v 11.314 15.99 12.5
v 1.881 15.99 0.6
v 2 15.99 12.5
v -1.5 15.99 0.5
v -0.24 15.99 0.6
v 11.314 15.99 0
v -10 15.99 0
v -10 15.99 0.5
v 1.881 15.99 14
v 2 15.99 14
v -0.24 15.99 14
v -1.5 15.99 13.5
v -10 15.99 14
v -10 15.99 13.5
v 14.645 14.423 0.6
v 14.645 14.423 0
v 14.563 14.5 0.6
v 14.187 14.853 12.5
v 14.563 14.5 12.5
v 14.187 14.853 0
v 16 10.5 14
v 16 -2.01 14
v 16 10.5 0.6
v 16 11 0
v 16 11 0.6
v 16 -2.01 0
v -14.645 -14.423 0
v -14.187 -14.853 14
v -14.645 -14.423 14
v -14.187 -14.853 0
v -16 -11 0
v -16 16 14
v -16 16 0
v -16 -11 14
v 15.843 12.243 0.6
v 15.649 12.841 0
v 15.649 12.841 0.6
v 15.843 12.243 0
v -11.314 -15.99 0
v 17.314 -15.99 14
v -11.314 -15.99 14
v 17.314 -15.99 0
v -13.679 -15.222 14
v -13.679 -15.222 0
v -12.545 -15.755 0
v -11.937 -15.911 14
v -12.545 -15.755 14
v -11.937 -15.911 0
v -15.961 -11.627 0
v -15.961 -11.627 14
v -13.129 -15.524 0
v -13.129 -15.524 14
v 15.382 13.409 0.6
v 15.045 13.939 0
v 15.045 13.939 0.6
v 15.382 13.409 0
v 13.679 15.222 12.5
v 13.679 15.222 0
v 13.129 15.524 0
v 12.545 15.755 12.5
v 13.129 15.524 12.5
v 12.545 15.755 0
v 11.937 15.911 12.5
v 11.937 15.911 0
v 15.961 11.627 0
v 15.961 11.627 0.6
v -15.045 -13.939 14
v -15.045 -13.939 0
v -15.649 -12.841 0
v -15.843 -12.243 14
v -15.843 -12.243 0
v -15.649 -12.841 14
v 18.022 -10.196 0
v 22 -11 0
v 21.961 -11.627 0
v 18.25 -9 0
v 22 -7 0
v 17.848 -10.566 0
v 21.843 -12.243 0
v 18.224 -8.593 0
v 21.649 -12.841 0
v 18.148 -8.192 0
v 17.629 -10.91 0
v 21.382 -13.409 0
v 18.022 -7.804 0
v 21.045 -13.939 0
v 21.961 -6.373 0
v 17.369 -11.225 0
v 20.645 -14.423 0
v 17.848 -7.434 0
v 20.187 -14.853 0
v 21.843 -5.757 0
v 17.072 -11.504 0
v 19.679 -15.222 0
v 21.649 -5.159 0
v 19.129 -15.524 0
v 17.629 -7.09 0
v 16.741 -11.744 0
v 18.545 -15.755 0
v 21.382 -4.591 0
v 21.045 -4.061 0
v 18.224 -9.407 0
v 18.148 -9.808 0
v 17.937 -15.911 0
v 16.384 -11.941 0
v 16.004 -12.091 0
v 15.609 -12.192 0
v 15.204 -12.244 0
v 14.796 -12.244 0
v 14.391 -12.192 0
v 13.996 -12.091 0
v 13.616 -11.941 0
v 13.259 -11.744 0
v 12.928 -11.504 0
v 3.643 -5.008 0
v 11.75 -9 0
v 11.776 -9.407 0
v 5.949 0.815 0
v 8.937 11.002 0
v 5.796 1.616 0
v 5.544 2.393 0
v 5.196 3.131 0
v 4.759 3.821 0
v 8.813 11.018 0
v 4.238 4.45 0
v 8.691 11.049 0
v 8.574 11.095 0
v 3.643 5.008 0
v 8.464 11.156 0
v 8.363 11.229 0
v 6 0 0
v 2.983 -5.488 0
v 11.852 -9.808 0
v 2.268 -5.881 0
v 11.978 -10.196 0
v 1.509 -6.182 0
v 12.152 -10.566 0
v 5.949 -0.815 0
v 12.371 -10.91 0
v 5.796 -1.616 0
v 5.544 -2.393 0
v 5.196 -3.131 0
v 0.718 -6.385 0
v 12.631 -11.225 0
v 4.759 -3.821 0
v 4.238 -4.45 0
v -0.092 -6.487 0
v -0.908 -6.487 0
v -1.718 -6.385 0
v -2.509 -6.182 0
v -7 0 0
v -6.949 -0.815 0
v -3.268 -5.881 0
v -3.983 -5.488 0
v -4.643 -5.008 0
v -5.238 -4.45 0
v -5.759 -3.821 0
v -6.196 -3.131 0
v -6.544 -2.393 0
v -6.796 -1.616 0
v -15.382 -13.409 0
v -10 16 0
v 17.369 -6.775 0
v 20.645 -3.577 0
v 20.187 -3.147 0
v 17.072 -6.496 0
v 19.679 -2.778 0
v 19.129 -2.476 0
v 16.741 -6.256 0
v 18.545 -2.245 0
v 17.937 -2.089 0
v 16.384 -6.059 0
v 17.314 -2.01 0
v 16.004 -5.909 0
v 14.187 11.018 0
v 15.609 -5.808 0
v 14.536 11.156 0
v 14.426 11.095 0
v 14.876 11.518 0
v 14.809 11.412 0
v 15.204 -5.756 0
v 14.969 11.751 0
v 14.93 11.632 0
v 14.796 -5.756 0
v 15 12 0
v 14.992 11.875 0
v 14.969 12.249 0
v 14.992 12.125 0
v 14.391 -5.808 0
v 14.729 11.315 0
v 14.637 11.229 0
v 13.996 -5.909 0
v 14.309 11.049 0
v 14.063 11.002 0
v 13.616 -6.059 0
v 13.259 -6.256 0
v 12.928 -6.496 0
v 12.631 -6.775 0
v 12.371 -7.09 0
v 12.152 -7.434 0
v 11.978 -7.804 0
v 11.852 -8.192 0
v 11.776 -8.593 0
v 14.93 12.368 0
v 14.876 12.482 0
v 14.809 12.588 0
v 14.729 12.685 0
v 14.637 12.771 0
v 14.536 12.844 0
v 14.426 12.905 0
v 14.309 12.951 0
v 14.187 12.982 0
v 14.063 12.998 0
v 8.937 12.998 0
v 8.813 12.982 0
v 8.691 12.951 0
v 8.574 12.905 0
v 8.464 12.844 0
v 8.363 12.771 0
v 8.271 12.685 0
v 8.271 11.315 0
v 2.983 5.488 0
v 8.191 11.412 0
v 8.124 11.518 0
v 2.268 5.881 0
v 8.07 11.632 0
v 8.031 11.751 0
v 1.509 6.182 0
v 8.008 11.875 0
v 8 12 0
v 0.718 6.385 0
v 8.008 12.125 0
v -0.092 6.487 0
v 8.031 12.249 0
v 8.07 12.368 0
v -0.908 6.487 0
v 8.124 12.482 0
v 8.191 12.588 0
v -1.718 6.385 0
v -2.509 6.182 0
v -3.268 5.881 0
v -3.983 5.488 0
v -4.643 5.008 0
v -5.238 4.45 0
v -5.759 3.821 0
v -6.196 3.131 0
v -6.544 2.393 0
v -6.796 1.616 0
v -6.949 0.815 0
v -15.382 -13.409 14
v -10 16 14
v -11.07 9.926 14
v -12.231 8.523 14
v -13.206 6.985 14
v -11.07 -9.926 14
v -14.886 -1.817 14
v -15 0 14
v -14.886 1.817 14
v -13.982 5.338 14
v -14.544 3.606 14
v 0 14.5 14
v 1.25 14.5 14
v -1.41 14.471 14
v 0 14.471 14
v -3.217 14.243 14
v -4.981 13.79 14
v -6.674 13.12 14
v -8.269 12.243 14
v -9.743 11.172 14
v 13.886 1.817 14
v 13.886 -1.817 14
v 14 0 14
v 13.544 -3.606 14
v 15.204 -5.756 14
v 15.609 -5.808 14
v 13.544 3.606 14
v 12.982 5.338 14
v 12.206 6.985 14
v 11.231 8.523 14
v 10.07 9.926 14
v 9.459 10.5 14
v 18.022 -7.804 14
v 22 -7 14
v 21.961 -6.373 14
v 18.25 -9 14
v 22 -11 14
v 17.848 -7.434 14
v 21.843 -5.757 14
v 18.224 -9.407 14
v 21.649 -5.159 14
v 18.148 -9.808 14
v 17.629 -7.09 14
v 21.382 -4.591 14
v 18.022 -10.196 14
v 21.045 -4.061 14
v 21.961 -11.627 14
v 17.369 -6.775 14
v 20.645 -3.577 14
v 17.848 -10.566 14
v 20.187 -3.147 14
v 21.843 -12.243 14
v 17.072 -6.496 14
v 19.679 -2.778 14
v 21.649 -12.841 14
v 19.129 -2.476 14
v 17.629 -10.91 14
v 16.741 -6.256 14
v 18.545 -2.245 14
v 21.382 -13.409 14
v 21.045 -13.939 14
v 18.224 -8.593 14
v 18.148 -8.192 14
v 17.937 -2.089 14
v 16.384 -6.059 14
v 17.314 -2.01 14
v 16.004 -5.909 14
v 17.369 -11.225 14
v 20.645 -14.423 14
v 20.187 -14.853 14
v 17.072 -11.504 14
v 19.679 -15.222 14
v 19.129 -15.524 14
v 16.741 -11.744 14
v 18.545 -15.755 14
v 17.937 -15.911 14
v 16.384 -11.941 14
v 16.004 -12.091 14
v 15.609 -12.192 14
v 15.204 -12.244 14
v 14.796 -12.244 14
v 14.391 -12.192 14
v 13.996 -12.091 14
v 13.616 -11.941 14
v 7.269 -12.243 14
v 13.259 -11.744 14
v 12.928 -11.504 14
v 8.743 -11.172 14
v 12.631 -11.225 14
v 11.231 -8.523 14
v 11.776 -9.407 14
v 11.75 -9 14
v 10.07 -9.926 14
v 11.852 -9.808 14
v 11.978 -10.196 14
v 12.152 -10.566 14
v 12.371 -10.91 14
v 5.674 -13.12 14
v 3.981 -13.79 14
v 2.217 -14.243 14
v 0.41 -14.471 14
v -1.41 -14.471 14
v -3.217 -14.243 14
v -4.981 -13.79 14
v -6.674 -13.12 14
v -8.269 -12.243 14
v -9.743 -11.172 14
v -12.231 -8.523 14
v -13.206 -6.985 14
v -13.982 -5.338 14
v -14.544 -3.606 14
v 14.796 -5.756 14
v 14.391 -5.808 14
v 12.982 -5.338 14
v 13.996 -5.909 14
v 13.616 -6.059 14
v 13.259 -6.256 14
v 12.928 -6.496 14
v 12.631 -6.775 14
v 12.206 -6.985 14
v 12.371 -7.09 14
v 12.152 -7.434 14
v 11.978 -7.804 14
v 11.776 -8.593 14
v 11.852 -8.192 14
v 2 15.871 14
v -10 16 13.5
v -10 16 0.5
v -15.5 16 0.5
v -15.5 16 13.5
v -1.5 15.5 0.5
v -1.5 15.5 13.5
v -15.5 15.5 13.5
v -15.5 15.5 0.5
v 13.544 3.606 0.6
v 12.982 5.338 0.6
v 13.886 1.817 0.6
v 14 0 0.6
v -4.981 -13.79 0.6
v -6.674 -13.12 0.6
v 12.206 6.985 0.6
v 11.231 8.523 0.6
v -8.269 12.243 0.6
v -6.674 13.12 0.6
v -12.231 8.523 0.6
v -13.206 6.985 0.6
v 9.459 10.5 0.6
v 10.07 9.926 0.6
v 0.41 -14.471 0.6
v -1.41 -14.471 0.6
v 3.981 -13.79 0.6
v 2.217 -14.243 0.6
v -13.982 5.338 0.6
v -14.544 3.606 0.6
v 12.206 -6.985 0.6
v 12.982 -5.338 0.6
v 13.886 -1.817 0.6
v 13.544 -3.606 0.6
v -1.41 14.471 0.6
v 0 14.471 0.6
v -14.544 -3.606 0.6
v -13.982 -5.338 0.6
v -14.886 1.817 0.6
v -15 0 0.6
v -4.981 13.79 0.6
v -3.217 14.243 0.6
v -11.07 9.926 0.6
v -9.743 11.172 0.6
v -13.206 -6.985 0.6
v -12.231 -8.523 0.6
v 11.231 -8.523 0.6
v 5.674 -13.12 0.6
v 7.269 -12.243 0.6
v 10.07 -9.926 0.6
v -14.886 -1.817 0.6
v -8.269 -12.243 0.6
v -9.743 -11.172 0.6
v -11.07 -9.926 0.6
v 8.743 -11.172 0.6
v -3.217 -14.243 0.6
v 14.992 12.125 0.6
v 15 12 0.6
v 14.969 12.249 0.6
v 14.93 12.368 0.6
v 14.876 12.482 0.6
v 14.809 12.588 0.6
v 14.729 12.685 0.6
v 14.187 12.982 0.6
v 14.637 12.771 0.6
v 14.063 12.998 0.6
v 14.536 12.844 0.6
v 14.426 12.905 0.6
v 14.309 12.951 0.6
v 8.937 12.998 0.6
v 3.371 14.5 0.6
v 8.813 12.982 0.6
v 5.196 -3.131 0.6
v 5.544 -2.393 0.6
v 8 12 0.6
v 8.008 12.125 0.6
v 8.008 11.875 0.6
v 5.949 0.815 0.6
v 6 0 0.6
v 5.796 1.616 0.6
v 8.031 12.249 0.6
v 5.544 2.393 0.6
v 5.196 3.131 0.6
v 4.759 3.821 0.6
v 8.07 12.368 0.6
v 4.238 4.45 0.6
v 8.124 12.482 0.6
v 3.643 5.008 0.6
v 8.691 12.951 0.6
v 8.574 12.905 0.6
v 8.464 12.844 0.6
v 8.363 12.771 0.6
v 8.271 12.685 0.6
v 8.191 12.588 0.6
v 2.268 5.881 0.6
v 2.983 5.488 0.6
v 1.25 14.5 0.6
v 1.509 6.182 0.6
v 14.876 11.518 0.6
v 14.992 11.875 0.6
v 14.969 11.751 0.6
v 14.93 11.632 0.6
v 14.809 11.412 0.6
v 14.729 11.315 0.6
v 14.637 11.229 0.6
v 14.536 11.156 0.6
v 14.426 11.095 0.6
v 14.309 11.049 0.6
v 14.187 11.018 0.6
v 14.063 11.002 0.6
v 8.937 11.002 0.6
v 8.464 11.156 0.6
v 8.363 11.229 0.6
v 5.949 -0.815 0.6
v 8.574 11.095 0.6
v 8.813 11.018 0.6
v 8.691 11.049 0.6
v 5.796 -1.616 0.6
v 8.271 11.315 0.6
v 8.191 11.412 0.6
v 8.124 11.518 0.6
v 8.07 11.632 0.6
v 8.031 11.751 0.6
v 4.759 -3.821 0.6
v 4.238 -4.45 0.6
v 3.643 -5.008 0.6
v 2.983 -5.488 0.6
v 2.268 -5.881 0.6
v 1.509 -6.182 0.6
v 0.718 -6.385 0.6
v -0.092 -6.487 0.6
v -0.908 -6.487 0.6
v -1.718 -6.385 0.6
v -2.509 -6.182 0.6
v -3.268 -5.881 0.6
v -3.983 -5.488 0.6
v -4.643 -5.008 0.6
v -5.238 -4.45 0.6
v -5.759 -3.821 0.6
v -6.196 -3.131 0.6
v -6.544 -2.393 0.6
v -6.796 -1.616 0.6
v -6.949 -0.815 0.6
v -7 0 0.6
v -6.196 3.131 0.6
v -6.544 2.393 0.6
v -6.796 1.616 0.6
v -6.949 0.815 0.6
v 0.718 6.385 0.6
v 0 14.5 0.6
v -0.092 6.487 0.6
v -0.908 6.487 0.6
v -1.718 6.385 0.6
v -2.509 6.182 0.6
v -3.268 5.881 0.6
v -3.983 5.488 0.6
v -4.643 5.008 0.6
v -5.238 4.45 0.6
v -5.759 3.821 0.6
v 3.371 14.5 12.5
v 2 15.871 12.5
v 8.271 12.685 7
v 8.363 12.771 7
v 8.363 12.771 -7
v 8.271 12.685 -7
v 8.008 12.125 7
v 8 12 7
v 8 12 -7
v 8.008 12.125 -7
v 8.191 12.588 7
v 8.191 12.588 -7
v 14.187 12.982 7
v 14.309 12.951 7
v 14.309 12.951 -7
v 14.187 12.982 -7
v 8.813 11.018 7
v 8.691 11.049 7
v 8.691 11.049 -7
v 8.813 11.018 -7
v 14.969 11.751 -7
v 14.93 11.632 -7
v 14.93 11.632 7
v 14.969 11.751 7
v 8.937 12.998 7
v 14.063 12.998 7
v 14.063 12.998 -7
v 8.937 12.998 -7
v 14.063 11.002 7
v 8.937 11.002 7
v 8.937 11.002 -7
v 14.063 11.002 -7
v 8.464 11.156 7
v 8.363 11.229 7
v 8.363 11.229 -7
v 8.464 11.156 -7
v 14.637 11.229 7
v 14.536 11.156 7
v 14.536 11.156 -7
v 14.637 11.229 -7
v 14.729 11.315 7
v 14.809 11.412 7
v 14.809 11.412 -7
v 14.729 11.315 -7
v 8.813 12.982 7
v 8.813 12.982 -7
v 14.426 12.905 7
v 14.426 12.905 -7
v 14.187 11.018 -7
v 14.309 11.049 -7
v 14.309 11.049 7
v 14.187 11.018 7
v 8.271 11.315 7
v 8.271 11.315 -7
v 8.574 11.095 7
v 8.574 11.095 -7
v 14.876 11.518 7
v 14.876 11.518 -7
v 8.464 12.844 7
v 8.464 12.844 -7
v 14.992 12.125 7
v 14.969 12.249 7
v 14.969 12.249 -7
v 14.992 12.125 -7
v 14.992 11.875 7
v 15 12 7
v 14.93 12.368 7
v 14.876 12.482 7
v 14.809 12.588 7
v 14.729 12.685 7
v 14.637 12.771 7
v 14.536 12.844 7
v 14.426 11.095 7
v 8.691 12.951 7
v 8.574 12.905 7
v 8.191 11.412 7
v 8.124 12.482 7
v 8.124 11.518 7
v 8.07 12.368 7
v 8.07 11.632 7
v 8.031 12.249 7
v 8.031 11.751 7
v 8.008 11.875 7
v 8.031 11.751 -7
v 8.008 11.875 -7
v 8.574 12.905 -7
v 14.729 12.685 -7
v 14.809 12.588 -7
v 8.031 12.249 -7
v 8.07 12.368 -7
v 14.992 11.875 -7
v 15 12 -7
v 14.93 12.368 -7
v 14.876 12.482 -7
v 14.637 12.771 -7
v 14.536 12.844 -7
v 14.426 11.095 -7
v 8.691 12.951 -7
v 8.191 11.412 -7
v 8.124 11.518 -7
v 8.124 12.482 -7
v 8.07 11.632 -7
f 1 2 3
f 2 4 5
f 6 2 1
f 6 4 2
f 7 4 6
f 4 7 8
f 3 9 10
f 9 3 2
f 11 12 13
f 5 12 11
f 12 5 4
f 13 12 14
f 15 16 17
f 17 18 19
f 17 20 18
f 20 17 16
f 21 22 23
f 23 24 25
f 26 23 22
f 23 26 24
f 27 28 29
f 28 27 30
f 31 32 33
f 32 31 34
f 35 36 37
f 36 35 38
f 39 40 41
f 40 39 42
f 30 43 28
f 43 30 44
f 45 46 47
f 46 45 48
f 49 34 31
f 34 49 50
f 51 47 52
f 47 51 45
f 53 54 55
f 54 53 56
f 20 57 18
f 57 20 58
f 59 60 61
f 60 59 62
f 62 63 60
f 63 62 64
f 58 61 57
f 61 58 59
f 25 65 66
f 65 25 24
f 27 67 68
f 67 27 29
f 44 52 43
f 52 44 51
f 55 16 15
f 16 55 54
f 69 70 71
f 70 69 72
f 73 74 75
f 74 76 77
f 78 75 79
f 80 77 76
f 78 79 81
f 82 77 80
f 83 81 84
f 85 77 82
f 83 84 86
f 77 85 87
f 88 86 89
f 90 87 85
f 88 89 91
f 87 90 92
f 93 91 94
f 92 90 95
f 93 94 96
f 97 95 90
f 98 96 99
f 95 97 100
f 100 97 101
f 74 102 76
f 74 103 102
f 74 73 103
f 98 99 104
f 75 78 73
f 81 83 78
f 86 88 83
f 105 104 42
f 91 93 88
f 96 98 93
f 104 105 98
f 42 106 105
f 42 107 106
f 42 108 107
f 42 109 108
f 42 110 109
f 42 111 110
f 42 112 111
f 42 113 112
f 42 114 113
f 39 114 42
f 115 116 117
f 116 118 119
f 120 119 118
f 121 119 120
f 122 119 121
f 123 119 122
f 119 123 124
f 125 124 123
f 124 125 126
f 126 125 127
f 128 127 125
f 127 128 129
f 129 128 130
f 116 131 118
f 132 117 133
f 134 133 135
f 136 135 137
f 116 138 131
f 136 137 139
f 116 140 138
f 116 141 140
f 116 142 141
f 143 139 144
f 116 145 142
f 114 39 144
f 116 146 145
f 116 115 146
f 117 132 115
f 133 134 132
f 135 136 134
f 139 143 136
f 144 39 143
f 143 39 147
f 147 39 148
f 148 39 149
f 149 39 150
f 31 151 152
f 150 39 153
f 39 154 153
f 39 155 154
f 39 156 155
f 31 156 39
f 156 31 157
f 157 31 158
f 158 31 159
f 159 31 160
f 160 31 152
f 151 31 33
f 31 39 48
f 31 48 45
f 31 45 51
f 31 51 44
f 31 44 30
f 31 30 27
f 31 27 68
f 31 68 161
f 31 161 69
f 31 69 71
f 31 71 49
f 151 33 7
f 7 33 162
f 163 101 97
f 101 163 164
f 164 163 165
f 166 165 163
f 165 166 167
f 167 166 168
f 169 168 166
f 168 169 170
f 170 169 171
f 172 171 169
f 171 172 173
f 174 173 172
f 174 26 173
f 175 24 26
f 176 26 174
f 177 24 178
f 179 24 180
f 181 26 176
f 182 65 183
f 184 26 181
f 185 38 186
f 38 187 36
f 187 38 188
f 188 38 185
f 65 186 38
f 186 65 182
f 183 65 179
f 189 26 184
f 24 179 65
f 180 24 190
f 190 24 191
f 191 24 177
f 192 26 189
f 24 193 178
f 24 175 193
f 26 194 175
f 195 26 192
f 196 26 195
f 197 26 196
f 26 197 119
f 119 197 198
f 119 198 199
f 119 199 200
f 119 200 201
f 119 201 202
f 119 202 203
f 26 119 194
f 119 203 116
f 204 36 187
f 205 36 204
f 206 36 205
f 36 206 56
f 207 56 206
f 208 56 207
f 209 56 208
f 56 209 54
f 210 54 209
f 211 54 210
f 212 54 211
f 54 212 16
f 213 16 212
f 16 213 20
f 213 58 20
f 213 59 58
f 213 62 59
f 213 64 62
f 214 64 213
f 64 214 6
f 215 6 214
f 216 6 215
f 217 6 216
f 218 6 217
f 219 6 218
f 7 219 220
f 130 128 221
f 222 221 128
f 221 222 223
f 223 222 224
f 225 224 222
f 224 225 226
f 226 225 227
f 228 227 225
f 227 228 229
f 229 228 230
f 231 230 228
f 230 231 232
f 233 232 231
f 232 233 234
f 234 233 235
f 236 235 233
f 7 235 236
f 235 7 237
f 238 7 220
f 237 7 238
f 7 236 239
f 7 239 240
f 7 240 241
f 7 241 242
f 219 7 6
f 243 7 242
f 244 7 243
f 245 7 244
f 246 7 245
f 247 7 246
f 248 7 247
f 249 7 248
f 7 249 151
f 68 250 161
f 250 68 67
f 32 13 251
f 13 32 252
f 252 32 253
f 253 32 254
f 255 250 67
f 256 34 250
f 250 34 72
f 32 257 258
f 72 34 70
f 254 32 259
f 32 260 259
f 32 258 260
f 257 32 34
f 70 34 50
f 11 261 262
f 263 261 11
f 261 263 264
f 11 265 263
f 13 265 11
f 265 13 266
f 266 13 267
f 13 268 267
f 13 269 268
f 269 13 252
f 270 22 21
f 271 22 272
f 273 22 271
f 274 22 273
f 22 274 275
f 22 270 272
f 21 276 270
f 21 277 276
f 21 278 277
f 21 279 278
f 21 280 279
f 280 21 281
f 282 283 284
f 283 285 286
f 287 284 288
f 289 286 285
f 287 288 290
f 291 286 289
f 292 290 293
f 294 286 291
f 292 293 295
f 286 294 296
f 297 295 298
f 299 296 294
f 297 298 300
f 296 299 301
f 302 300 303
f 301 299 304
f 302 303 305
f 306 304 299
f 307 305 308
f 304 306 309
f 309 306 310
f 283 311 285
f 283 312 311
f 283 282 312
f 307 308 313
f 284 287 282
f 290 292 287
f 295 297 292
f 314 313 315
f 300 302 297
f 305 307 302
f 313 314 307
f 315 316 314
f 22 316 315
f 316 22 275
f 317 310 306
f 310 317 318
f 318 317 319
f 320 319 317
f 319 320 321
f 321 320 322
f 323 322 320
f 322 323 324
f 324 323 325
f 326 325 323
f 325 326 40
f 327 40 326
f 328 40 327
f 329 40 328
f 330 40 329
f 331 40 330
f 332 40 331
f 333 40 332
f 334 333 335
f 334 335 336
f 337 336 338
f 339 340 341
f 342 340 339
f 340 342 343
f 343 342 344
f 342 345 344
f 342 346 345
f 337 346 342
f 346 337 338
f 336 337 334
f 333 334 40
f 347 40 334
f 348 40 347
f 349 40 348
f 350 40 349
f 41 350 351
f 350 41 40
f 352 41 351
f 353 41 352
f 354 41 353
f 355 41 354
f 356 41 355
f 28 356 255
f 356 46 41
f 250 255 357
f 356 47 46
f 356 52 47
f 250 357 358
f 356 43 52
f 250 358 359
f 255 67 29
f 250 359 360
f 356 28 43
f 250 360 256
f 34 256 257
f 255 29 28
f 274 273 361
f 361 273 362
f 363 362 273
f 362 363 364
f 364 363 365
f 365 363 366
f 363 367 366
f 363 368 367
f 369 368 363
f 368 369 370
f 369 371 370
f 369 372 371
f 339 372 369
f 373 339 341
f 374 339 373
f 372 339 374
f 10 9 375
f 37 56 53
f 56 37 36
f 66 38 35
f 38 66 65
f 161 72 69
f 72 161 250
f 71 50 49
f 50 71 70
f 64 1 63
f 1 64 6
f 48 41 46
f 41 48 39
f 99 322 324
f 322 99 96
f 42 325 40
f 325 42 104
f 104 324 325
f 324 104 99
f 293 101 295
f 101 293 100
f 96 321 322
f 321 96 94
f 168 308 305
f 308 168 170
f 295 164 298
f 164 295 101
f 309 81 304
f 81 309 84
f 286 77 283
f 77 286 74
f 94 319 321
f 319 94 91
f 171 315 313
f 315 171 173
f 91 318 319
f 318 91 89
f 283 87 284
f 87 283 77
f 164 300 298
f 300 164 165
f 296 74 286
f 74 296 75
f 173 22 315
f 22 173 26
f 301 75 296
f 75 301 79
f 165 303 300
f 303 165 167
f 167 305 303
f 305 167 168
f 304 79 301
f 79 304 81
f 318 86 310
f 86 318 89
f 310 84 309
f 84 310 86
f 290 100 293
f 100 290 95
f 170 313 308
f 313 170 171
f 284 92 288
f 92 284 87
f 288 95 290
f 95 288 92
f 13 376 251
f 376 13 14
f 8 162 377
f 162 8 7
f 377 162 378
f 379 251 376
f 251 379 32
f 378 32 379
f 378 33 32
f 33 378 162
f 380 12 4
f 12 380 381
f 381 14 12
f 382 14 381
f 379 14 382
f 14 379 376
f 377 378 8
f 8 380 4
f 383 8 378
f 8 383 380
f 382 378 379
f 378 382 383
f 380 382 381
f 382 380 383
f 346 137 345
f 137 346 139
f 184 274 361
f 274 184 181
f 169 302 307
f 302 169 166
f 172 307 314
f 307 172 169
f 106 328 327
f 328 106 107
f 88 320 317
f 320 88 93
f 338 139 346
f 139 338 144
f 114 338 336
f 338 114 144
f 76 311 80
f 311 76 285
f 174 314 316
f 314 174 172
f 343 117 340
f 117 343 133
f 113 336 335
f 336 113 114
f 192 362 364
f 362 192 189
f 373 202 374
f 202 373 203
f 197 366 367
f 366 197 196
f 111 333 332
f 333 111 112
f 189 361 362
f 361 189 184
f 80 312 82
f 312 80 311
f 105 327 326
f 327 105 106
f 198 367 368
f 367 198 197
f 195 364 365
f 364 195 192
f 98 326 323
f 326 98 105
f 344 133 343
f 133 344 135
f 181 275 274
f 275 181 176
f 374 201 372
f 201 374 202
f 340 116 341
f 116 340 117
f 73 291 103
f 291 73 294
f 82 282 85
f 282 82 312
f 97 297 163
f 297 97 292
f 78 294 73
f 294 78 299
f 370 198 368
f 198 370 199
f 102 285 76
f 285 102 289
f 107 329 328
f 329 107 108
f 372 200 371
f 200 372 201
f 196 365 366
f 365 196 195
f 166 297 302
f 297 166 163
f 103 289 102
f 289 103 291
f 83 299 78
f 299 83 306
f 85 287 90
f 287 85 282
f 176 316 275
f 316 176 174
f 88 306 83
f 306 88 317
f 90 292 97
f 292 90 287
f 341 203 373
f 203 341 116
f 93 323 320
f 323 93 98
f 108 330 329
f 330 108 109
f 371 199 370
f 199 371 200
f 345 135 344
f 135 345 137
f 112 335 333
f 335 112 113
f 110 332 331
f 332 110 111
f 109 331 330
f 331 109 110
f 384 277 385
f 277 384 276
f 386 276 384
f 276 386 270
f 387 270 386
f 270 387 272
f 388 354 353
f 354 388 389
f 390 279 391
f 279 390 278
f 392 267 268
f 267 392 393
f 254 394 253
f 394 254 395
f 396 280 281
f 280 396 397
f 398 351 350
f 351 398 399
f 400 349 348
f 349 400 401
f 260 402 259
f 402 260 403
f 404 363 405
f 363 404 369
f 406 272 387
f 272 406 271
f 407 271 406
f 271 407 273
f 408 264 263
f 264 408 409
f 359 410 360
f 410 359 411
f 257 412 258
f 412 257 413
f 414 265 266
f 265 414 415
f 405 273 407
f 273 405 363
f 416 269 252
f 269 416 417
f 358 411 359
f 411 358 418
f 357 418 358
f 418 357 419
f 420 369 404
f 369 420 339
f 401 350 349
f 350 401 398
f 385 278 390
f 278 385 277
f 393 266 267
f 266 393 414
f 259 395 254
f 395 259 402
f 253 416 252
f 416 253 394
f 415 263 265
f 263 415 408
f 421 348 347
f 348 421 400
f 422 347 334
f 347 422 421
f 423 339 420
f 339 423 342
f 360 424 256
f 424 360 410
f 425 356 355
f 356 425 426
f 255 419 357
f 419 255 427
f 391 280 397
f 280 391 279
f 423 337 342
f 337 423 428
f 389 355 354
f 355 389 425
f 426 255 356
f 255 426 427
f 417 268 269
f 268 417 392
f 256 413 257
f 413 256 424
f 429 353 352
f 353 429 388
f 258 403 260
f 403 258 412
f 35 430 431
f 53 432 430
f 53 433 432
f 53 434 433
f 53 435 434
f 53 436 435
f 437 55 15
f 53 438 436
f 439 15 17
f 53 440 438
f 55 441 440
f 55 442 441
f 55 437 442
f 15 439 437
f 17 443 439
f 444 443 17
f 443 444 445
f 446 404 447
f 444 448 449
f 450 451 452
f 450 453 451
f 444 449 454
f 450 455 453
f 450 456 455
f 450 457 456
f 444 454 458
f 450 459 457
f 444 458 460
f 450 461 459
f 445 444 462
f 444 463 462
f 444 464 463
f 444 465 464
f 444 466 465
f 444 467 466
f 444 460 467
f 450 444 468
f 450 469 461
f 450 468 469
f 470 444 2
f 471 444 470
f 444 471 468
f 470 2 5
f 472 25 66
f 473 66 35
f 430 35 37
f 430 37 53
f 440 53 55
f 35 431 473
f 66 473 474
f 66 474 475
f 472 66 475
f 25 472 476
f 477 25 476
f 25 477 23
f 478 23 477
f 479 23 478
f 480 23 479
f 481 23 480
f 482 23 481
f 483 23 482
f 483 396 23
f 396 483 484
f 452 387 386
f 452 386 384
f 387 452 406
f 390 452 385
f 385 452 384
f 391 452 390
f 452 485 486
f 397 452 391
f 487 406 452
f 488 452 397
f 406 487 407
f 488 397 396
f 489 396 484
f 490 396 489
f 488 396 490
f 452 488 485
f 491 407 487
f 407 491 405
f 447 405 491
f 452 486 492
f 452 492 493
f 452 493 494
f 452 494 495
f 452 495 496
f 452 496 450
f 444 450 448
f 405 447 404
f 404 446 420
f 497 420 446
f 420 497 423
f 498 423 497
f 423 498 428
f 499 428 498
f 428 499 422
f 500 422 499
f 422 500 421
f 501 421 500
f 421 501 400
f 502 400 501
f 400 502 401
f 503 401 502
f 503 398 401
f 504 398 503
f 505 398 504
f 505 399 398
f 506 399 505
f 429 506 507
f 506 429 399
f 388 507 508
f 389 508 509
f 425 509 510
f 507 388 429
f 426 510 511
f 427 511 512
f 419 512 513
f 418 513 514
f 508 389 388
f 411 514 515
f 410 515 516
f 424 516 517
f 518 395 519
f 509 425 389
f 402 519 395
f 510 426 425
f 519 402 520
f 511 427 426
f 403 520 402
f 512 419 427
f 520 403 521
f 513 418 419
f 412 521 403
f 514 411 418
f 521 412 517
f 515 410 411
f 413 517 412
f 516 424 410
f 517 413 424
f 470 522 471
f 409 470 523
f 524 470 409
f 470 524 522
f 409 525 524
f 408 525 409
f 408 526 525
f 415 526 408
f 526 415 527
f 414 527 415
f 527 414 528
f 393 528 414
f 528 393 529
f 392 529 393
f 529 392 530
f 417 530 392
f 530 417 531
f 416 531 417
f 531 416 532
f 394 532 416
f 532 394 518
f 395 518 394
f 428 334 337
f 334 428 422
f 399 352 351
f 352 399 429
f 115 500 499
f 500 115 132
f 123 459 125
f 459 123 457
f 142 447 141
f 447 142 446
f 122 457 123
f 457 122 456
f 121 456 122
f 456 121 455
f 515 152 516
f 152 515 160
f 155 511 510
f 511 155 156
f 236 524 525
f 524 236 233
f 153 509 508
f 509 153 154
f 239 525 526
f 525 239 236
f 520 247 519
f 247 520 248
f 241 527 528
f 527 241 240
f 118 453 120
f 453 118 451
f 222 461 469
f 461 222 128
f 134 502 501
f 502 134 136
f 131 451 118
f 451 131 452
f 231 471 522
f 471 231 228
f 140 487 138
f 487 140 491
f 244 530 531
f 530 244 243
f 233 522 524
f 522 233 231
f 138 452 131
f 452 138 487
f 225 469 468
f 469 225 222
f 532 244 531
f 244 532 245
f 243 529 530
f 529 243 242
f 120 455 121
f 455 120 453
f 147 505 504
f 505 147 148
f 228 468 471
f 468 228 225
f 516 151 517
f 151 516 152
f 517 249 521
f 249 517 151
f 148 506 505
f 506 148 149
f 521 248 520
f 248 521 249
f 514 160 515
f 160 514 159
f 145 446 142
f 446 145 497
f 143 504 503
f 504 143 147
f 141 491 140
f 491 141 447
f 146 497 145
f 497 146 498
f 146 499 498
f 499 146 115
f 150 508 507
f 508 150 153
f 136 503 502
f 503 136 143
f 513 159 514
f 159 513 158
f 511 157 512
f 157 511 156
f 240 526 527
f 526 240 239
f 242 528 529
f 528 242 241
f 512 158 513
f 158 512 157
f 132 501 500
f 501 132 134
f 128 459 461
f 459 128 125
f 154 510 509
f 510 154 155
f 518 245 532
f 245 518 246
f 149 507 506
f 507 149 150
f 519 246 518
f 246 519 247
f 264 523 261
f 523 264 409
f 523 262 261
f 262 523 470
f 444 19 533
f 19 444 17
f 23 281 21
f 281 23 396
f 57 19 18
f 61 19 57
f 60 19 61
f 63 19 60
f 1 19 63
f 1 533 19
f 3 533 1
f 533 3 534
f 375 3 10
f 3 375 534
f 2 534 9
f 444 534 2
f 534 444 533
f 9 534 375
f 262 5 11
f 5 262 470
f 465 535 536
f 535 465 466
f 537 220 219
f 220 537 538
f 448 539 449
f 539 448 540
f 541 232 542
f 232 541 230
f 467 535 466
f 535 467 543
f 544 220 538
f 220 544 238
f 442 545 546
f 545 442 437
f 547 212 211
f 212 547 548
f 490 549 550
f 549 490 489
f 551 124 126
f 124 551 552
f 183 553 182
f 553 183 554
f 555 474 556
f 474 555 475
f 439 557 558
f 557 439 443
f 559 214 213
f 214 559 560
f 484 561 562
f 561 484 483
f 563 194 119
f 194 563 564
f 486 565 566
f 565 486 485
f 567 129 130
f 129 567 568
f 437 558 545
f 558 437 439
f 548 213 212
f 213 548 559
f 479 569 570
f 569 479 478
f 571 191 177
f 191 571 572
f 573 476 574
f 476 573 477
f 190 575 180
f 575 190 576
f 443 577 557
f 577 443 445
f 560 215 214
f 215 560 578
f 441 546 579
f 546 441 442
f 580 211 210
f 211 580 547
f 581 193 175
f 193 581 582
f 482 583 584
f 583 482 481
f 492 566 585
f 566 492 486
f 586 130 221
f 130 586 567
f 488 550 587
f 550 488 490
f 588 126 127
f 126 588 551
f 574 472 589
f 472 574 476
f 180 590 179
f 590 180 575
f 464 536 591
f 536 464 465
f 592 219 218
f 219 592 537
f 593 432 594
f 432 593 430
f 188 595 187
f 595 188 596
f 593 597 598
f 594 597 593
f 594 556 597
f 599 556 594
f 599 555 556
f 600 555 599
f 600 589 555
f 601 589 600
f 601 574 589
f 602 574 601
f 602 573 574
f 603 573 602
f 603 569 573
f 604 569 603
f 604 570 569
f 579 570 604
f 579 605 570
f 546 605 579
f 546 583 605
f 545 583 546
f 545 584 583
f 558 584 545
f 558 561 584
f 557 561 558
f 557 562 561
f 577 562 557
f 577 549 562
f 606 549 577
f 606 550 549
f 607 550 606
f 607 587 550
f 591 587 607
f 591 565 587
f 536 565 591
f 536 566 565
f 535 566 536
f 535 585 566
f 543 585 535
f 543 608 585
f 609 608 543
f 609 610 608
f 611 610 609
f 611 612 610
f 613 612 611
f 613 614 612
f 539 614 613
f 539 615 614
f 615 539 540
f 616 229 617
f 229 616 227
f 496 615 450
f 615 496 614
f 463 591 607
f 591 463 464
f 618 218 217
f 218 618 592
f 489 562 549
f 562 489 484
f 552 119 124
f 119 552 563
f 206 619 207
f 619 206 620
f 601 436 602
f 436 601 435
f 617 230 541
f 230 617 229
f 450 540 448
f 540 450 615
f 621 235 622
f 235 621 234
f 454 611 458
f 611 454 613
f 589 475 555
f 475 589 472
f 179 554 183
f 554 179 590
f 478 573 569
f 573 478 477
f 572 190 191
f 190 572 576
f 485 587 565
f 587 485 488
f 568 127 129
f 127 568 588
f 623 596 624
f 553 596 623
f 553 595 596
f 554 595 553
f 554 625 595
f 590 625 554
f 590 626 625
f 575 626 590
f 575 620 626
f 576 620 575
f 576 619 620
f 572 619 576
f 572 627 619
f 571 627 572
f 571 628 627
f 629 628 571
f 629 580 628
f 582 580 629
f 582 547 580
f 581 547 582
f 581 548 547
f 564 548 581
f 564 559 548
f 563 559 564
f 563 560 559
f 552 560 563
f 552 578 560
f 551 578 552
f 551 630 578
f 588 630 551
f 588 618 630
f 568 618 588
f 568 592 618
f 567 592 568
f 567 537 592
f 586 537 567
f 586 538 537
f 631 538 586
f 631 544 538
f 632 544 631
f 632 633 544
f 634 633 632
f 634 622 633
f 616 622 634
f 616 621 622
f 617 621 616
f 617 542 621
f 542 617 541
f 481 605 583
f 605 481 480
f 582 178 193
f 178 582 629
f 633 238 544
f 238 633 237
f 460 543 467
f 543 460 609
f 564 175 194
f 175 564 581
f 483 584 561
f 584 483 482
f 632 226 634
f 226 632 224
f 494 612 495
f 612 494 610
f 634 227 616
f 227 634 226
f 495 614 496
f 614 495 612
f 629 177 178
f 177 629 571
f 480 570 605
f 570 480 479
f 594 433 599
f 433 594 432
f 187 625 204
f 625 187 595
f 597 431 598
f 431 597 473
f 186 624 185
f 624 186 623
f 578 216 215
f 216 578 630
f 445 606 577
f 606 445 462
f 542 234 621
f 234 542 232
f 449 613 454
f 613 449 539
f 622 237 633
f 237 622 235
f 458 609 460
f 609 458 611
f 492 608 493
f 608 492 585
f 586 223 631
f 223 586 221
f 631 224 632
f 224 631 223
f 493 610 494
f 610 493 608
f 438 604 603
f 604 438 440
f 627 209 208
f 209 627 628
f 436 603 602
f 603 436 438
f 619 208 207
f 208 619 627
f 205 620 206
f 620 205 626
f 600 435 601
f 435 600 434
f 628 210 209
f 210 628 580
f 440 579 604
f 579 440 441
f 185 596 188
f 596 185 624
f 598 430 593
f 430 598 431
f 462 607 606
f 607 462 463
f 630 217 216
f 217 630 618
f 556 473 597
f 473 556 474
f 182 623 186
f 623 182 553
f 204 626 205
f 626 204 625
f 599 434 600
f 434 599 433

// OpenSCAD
$fn = 50;


union() {
	difference() {
		union() {
			hull() {
				translate(v = [-11.0000000000, 11.0000000000, 0]) {
					cylinder(h = 14, r = 5);
				}
				translate(v = [11.0000000000, 11.0000000000, 0]) {
					cylinder(h = 14, r = 5);
				}
				translate(v = [-11.0000000000, -11.0000000000, 0]) {
					cylinder(h = 14, r = 5);
				}
				translate(v = [11.0000000000, -11.0000000000, 0]) {
					cylinder(h = 14, r = 5);
				}
			}
			translate(v = [7.5000000000, -9.0000000000, 0]) {
				hull() {
					translate(v = [-9.5000000000, 2.0000000000, 0]) {
						cylinder(h = 14, r = 5);
					}
					translate(v = [9.5000000000, 2.0000000000, 0]) {
						cylinder(h = 14, r = 5);
					}
					translate(v = [-9.5000000000, -2.0000000000, 0]) {
						cylinder(h = 14, r = 5);
					}
					translate(v = [9.5000000000, -2.0000000000, 0]) {
						cylinder(h = 14, r = 5);
					}
				}
			}
			translate(v = [-16.0000000000, 10.0000000000, 0]) {
				cube(size = [6, 6, 14]);
			}
		}
		union() {
			translate(v = [-15.5000000000, 15.5000000000, 0.5000000000]) {
				cube(size = [14, 0.5000000000, 13.0000000000]);
			}
			translate(v = [15.0000000000, -9.0000000000, -100.0000000000]) {
				cylinder(h = 200, r = 3.2500000000);
			}
			translate(v = [-0.5000000000, 0.0000000000, 0.6000000000]) {
				cylinder(h = 16.4000000000, r = 14.5000000000);
			}
			translate(v = [-0.5000000000, 0.0000000000, -7.0000000000]) {
				cylinder(h = 14, r = 6.5000000000);
			}
			translate(v = [0.0000000000, 10.5000000000, 0.6000000000]) {
				cube(size = [16.0000000000, 4, 16.4000000000]);
			}
			translate(v = [2.0000000000, 10.5000000000, 12.5000000000]) {
				cube(size = [14.0000000000, 7, 1.5000000000]);
			}
			translate(v = [-3.0000000000, 18.7500000000, 0.6000000000]) {
				rotate(a = [0, 0, -45]) {
					cube(size = [10, 1.5000000000, 16.4000000000]);
				}
			}
			translate(v = [2.2500000000, 11.0000000000, 0.6000000000]) {
				cube(size = [7.5000000000, 2, 13.4000000000]);
			}
		}
	}
	union() {
		translate(v = [11.5000000000, 12, -7.0000000000]) {
			rotate(a = [0, 0, 0]) {
				difference() {
					union() {
						hull() {
							translate(v = [2.5000000000, 0, 0]) {
								cylinder(h = 14, r = 1.0000000000, r1 = 1.0000000000, r2 = 1.0000000000);
							}
							translate(v = [-2.5000000000, 0, 0]) {
								cylinder(h = 14, r = 1.0000000000, r1 = 1.0000000000, r2 = 1.0000000000);
							}
						}
					}
					union();
				}
			}
		}
	}
}
